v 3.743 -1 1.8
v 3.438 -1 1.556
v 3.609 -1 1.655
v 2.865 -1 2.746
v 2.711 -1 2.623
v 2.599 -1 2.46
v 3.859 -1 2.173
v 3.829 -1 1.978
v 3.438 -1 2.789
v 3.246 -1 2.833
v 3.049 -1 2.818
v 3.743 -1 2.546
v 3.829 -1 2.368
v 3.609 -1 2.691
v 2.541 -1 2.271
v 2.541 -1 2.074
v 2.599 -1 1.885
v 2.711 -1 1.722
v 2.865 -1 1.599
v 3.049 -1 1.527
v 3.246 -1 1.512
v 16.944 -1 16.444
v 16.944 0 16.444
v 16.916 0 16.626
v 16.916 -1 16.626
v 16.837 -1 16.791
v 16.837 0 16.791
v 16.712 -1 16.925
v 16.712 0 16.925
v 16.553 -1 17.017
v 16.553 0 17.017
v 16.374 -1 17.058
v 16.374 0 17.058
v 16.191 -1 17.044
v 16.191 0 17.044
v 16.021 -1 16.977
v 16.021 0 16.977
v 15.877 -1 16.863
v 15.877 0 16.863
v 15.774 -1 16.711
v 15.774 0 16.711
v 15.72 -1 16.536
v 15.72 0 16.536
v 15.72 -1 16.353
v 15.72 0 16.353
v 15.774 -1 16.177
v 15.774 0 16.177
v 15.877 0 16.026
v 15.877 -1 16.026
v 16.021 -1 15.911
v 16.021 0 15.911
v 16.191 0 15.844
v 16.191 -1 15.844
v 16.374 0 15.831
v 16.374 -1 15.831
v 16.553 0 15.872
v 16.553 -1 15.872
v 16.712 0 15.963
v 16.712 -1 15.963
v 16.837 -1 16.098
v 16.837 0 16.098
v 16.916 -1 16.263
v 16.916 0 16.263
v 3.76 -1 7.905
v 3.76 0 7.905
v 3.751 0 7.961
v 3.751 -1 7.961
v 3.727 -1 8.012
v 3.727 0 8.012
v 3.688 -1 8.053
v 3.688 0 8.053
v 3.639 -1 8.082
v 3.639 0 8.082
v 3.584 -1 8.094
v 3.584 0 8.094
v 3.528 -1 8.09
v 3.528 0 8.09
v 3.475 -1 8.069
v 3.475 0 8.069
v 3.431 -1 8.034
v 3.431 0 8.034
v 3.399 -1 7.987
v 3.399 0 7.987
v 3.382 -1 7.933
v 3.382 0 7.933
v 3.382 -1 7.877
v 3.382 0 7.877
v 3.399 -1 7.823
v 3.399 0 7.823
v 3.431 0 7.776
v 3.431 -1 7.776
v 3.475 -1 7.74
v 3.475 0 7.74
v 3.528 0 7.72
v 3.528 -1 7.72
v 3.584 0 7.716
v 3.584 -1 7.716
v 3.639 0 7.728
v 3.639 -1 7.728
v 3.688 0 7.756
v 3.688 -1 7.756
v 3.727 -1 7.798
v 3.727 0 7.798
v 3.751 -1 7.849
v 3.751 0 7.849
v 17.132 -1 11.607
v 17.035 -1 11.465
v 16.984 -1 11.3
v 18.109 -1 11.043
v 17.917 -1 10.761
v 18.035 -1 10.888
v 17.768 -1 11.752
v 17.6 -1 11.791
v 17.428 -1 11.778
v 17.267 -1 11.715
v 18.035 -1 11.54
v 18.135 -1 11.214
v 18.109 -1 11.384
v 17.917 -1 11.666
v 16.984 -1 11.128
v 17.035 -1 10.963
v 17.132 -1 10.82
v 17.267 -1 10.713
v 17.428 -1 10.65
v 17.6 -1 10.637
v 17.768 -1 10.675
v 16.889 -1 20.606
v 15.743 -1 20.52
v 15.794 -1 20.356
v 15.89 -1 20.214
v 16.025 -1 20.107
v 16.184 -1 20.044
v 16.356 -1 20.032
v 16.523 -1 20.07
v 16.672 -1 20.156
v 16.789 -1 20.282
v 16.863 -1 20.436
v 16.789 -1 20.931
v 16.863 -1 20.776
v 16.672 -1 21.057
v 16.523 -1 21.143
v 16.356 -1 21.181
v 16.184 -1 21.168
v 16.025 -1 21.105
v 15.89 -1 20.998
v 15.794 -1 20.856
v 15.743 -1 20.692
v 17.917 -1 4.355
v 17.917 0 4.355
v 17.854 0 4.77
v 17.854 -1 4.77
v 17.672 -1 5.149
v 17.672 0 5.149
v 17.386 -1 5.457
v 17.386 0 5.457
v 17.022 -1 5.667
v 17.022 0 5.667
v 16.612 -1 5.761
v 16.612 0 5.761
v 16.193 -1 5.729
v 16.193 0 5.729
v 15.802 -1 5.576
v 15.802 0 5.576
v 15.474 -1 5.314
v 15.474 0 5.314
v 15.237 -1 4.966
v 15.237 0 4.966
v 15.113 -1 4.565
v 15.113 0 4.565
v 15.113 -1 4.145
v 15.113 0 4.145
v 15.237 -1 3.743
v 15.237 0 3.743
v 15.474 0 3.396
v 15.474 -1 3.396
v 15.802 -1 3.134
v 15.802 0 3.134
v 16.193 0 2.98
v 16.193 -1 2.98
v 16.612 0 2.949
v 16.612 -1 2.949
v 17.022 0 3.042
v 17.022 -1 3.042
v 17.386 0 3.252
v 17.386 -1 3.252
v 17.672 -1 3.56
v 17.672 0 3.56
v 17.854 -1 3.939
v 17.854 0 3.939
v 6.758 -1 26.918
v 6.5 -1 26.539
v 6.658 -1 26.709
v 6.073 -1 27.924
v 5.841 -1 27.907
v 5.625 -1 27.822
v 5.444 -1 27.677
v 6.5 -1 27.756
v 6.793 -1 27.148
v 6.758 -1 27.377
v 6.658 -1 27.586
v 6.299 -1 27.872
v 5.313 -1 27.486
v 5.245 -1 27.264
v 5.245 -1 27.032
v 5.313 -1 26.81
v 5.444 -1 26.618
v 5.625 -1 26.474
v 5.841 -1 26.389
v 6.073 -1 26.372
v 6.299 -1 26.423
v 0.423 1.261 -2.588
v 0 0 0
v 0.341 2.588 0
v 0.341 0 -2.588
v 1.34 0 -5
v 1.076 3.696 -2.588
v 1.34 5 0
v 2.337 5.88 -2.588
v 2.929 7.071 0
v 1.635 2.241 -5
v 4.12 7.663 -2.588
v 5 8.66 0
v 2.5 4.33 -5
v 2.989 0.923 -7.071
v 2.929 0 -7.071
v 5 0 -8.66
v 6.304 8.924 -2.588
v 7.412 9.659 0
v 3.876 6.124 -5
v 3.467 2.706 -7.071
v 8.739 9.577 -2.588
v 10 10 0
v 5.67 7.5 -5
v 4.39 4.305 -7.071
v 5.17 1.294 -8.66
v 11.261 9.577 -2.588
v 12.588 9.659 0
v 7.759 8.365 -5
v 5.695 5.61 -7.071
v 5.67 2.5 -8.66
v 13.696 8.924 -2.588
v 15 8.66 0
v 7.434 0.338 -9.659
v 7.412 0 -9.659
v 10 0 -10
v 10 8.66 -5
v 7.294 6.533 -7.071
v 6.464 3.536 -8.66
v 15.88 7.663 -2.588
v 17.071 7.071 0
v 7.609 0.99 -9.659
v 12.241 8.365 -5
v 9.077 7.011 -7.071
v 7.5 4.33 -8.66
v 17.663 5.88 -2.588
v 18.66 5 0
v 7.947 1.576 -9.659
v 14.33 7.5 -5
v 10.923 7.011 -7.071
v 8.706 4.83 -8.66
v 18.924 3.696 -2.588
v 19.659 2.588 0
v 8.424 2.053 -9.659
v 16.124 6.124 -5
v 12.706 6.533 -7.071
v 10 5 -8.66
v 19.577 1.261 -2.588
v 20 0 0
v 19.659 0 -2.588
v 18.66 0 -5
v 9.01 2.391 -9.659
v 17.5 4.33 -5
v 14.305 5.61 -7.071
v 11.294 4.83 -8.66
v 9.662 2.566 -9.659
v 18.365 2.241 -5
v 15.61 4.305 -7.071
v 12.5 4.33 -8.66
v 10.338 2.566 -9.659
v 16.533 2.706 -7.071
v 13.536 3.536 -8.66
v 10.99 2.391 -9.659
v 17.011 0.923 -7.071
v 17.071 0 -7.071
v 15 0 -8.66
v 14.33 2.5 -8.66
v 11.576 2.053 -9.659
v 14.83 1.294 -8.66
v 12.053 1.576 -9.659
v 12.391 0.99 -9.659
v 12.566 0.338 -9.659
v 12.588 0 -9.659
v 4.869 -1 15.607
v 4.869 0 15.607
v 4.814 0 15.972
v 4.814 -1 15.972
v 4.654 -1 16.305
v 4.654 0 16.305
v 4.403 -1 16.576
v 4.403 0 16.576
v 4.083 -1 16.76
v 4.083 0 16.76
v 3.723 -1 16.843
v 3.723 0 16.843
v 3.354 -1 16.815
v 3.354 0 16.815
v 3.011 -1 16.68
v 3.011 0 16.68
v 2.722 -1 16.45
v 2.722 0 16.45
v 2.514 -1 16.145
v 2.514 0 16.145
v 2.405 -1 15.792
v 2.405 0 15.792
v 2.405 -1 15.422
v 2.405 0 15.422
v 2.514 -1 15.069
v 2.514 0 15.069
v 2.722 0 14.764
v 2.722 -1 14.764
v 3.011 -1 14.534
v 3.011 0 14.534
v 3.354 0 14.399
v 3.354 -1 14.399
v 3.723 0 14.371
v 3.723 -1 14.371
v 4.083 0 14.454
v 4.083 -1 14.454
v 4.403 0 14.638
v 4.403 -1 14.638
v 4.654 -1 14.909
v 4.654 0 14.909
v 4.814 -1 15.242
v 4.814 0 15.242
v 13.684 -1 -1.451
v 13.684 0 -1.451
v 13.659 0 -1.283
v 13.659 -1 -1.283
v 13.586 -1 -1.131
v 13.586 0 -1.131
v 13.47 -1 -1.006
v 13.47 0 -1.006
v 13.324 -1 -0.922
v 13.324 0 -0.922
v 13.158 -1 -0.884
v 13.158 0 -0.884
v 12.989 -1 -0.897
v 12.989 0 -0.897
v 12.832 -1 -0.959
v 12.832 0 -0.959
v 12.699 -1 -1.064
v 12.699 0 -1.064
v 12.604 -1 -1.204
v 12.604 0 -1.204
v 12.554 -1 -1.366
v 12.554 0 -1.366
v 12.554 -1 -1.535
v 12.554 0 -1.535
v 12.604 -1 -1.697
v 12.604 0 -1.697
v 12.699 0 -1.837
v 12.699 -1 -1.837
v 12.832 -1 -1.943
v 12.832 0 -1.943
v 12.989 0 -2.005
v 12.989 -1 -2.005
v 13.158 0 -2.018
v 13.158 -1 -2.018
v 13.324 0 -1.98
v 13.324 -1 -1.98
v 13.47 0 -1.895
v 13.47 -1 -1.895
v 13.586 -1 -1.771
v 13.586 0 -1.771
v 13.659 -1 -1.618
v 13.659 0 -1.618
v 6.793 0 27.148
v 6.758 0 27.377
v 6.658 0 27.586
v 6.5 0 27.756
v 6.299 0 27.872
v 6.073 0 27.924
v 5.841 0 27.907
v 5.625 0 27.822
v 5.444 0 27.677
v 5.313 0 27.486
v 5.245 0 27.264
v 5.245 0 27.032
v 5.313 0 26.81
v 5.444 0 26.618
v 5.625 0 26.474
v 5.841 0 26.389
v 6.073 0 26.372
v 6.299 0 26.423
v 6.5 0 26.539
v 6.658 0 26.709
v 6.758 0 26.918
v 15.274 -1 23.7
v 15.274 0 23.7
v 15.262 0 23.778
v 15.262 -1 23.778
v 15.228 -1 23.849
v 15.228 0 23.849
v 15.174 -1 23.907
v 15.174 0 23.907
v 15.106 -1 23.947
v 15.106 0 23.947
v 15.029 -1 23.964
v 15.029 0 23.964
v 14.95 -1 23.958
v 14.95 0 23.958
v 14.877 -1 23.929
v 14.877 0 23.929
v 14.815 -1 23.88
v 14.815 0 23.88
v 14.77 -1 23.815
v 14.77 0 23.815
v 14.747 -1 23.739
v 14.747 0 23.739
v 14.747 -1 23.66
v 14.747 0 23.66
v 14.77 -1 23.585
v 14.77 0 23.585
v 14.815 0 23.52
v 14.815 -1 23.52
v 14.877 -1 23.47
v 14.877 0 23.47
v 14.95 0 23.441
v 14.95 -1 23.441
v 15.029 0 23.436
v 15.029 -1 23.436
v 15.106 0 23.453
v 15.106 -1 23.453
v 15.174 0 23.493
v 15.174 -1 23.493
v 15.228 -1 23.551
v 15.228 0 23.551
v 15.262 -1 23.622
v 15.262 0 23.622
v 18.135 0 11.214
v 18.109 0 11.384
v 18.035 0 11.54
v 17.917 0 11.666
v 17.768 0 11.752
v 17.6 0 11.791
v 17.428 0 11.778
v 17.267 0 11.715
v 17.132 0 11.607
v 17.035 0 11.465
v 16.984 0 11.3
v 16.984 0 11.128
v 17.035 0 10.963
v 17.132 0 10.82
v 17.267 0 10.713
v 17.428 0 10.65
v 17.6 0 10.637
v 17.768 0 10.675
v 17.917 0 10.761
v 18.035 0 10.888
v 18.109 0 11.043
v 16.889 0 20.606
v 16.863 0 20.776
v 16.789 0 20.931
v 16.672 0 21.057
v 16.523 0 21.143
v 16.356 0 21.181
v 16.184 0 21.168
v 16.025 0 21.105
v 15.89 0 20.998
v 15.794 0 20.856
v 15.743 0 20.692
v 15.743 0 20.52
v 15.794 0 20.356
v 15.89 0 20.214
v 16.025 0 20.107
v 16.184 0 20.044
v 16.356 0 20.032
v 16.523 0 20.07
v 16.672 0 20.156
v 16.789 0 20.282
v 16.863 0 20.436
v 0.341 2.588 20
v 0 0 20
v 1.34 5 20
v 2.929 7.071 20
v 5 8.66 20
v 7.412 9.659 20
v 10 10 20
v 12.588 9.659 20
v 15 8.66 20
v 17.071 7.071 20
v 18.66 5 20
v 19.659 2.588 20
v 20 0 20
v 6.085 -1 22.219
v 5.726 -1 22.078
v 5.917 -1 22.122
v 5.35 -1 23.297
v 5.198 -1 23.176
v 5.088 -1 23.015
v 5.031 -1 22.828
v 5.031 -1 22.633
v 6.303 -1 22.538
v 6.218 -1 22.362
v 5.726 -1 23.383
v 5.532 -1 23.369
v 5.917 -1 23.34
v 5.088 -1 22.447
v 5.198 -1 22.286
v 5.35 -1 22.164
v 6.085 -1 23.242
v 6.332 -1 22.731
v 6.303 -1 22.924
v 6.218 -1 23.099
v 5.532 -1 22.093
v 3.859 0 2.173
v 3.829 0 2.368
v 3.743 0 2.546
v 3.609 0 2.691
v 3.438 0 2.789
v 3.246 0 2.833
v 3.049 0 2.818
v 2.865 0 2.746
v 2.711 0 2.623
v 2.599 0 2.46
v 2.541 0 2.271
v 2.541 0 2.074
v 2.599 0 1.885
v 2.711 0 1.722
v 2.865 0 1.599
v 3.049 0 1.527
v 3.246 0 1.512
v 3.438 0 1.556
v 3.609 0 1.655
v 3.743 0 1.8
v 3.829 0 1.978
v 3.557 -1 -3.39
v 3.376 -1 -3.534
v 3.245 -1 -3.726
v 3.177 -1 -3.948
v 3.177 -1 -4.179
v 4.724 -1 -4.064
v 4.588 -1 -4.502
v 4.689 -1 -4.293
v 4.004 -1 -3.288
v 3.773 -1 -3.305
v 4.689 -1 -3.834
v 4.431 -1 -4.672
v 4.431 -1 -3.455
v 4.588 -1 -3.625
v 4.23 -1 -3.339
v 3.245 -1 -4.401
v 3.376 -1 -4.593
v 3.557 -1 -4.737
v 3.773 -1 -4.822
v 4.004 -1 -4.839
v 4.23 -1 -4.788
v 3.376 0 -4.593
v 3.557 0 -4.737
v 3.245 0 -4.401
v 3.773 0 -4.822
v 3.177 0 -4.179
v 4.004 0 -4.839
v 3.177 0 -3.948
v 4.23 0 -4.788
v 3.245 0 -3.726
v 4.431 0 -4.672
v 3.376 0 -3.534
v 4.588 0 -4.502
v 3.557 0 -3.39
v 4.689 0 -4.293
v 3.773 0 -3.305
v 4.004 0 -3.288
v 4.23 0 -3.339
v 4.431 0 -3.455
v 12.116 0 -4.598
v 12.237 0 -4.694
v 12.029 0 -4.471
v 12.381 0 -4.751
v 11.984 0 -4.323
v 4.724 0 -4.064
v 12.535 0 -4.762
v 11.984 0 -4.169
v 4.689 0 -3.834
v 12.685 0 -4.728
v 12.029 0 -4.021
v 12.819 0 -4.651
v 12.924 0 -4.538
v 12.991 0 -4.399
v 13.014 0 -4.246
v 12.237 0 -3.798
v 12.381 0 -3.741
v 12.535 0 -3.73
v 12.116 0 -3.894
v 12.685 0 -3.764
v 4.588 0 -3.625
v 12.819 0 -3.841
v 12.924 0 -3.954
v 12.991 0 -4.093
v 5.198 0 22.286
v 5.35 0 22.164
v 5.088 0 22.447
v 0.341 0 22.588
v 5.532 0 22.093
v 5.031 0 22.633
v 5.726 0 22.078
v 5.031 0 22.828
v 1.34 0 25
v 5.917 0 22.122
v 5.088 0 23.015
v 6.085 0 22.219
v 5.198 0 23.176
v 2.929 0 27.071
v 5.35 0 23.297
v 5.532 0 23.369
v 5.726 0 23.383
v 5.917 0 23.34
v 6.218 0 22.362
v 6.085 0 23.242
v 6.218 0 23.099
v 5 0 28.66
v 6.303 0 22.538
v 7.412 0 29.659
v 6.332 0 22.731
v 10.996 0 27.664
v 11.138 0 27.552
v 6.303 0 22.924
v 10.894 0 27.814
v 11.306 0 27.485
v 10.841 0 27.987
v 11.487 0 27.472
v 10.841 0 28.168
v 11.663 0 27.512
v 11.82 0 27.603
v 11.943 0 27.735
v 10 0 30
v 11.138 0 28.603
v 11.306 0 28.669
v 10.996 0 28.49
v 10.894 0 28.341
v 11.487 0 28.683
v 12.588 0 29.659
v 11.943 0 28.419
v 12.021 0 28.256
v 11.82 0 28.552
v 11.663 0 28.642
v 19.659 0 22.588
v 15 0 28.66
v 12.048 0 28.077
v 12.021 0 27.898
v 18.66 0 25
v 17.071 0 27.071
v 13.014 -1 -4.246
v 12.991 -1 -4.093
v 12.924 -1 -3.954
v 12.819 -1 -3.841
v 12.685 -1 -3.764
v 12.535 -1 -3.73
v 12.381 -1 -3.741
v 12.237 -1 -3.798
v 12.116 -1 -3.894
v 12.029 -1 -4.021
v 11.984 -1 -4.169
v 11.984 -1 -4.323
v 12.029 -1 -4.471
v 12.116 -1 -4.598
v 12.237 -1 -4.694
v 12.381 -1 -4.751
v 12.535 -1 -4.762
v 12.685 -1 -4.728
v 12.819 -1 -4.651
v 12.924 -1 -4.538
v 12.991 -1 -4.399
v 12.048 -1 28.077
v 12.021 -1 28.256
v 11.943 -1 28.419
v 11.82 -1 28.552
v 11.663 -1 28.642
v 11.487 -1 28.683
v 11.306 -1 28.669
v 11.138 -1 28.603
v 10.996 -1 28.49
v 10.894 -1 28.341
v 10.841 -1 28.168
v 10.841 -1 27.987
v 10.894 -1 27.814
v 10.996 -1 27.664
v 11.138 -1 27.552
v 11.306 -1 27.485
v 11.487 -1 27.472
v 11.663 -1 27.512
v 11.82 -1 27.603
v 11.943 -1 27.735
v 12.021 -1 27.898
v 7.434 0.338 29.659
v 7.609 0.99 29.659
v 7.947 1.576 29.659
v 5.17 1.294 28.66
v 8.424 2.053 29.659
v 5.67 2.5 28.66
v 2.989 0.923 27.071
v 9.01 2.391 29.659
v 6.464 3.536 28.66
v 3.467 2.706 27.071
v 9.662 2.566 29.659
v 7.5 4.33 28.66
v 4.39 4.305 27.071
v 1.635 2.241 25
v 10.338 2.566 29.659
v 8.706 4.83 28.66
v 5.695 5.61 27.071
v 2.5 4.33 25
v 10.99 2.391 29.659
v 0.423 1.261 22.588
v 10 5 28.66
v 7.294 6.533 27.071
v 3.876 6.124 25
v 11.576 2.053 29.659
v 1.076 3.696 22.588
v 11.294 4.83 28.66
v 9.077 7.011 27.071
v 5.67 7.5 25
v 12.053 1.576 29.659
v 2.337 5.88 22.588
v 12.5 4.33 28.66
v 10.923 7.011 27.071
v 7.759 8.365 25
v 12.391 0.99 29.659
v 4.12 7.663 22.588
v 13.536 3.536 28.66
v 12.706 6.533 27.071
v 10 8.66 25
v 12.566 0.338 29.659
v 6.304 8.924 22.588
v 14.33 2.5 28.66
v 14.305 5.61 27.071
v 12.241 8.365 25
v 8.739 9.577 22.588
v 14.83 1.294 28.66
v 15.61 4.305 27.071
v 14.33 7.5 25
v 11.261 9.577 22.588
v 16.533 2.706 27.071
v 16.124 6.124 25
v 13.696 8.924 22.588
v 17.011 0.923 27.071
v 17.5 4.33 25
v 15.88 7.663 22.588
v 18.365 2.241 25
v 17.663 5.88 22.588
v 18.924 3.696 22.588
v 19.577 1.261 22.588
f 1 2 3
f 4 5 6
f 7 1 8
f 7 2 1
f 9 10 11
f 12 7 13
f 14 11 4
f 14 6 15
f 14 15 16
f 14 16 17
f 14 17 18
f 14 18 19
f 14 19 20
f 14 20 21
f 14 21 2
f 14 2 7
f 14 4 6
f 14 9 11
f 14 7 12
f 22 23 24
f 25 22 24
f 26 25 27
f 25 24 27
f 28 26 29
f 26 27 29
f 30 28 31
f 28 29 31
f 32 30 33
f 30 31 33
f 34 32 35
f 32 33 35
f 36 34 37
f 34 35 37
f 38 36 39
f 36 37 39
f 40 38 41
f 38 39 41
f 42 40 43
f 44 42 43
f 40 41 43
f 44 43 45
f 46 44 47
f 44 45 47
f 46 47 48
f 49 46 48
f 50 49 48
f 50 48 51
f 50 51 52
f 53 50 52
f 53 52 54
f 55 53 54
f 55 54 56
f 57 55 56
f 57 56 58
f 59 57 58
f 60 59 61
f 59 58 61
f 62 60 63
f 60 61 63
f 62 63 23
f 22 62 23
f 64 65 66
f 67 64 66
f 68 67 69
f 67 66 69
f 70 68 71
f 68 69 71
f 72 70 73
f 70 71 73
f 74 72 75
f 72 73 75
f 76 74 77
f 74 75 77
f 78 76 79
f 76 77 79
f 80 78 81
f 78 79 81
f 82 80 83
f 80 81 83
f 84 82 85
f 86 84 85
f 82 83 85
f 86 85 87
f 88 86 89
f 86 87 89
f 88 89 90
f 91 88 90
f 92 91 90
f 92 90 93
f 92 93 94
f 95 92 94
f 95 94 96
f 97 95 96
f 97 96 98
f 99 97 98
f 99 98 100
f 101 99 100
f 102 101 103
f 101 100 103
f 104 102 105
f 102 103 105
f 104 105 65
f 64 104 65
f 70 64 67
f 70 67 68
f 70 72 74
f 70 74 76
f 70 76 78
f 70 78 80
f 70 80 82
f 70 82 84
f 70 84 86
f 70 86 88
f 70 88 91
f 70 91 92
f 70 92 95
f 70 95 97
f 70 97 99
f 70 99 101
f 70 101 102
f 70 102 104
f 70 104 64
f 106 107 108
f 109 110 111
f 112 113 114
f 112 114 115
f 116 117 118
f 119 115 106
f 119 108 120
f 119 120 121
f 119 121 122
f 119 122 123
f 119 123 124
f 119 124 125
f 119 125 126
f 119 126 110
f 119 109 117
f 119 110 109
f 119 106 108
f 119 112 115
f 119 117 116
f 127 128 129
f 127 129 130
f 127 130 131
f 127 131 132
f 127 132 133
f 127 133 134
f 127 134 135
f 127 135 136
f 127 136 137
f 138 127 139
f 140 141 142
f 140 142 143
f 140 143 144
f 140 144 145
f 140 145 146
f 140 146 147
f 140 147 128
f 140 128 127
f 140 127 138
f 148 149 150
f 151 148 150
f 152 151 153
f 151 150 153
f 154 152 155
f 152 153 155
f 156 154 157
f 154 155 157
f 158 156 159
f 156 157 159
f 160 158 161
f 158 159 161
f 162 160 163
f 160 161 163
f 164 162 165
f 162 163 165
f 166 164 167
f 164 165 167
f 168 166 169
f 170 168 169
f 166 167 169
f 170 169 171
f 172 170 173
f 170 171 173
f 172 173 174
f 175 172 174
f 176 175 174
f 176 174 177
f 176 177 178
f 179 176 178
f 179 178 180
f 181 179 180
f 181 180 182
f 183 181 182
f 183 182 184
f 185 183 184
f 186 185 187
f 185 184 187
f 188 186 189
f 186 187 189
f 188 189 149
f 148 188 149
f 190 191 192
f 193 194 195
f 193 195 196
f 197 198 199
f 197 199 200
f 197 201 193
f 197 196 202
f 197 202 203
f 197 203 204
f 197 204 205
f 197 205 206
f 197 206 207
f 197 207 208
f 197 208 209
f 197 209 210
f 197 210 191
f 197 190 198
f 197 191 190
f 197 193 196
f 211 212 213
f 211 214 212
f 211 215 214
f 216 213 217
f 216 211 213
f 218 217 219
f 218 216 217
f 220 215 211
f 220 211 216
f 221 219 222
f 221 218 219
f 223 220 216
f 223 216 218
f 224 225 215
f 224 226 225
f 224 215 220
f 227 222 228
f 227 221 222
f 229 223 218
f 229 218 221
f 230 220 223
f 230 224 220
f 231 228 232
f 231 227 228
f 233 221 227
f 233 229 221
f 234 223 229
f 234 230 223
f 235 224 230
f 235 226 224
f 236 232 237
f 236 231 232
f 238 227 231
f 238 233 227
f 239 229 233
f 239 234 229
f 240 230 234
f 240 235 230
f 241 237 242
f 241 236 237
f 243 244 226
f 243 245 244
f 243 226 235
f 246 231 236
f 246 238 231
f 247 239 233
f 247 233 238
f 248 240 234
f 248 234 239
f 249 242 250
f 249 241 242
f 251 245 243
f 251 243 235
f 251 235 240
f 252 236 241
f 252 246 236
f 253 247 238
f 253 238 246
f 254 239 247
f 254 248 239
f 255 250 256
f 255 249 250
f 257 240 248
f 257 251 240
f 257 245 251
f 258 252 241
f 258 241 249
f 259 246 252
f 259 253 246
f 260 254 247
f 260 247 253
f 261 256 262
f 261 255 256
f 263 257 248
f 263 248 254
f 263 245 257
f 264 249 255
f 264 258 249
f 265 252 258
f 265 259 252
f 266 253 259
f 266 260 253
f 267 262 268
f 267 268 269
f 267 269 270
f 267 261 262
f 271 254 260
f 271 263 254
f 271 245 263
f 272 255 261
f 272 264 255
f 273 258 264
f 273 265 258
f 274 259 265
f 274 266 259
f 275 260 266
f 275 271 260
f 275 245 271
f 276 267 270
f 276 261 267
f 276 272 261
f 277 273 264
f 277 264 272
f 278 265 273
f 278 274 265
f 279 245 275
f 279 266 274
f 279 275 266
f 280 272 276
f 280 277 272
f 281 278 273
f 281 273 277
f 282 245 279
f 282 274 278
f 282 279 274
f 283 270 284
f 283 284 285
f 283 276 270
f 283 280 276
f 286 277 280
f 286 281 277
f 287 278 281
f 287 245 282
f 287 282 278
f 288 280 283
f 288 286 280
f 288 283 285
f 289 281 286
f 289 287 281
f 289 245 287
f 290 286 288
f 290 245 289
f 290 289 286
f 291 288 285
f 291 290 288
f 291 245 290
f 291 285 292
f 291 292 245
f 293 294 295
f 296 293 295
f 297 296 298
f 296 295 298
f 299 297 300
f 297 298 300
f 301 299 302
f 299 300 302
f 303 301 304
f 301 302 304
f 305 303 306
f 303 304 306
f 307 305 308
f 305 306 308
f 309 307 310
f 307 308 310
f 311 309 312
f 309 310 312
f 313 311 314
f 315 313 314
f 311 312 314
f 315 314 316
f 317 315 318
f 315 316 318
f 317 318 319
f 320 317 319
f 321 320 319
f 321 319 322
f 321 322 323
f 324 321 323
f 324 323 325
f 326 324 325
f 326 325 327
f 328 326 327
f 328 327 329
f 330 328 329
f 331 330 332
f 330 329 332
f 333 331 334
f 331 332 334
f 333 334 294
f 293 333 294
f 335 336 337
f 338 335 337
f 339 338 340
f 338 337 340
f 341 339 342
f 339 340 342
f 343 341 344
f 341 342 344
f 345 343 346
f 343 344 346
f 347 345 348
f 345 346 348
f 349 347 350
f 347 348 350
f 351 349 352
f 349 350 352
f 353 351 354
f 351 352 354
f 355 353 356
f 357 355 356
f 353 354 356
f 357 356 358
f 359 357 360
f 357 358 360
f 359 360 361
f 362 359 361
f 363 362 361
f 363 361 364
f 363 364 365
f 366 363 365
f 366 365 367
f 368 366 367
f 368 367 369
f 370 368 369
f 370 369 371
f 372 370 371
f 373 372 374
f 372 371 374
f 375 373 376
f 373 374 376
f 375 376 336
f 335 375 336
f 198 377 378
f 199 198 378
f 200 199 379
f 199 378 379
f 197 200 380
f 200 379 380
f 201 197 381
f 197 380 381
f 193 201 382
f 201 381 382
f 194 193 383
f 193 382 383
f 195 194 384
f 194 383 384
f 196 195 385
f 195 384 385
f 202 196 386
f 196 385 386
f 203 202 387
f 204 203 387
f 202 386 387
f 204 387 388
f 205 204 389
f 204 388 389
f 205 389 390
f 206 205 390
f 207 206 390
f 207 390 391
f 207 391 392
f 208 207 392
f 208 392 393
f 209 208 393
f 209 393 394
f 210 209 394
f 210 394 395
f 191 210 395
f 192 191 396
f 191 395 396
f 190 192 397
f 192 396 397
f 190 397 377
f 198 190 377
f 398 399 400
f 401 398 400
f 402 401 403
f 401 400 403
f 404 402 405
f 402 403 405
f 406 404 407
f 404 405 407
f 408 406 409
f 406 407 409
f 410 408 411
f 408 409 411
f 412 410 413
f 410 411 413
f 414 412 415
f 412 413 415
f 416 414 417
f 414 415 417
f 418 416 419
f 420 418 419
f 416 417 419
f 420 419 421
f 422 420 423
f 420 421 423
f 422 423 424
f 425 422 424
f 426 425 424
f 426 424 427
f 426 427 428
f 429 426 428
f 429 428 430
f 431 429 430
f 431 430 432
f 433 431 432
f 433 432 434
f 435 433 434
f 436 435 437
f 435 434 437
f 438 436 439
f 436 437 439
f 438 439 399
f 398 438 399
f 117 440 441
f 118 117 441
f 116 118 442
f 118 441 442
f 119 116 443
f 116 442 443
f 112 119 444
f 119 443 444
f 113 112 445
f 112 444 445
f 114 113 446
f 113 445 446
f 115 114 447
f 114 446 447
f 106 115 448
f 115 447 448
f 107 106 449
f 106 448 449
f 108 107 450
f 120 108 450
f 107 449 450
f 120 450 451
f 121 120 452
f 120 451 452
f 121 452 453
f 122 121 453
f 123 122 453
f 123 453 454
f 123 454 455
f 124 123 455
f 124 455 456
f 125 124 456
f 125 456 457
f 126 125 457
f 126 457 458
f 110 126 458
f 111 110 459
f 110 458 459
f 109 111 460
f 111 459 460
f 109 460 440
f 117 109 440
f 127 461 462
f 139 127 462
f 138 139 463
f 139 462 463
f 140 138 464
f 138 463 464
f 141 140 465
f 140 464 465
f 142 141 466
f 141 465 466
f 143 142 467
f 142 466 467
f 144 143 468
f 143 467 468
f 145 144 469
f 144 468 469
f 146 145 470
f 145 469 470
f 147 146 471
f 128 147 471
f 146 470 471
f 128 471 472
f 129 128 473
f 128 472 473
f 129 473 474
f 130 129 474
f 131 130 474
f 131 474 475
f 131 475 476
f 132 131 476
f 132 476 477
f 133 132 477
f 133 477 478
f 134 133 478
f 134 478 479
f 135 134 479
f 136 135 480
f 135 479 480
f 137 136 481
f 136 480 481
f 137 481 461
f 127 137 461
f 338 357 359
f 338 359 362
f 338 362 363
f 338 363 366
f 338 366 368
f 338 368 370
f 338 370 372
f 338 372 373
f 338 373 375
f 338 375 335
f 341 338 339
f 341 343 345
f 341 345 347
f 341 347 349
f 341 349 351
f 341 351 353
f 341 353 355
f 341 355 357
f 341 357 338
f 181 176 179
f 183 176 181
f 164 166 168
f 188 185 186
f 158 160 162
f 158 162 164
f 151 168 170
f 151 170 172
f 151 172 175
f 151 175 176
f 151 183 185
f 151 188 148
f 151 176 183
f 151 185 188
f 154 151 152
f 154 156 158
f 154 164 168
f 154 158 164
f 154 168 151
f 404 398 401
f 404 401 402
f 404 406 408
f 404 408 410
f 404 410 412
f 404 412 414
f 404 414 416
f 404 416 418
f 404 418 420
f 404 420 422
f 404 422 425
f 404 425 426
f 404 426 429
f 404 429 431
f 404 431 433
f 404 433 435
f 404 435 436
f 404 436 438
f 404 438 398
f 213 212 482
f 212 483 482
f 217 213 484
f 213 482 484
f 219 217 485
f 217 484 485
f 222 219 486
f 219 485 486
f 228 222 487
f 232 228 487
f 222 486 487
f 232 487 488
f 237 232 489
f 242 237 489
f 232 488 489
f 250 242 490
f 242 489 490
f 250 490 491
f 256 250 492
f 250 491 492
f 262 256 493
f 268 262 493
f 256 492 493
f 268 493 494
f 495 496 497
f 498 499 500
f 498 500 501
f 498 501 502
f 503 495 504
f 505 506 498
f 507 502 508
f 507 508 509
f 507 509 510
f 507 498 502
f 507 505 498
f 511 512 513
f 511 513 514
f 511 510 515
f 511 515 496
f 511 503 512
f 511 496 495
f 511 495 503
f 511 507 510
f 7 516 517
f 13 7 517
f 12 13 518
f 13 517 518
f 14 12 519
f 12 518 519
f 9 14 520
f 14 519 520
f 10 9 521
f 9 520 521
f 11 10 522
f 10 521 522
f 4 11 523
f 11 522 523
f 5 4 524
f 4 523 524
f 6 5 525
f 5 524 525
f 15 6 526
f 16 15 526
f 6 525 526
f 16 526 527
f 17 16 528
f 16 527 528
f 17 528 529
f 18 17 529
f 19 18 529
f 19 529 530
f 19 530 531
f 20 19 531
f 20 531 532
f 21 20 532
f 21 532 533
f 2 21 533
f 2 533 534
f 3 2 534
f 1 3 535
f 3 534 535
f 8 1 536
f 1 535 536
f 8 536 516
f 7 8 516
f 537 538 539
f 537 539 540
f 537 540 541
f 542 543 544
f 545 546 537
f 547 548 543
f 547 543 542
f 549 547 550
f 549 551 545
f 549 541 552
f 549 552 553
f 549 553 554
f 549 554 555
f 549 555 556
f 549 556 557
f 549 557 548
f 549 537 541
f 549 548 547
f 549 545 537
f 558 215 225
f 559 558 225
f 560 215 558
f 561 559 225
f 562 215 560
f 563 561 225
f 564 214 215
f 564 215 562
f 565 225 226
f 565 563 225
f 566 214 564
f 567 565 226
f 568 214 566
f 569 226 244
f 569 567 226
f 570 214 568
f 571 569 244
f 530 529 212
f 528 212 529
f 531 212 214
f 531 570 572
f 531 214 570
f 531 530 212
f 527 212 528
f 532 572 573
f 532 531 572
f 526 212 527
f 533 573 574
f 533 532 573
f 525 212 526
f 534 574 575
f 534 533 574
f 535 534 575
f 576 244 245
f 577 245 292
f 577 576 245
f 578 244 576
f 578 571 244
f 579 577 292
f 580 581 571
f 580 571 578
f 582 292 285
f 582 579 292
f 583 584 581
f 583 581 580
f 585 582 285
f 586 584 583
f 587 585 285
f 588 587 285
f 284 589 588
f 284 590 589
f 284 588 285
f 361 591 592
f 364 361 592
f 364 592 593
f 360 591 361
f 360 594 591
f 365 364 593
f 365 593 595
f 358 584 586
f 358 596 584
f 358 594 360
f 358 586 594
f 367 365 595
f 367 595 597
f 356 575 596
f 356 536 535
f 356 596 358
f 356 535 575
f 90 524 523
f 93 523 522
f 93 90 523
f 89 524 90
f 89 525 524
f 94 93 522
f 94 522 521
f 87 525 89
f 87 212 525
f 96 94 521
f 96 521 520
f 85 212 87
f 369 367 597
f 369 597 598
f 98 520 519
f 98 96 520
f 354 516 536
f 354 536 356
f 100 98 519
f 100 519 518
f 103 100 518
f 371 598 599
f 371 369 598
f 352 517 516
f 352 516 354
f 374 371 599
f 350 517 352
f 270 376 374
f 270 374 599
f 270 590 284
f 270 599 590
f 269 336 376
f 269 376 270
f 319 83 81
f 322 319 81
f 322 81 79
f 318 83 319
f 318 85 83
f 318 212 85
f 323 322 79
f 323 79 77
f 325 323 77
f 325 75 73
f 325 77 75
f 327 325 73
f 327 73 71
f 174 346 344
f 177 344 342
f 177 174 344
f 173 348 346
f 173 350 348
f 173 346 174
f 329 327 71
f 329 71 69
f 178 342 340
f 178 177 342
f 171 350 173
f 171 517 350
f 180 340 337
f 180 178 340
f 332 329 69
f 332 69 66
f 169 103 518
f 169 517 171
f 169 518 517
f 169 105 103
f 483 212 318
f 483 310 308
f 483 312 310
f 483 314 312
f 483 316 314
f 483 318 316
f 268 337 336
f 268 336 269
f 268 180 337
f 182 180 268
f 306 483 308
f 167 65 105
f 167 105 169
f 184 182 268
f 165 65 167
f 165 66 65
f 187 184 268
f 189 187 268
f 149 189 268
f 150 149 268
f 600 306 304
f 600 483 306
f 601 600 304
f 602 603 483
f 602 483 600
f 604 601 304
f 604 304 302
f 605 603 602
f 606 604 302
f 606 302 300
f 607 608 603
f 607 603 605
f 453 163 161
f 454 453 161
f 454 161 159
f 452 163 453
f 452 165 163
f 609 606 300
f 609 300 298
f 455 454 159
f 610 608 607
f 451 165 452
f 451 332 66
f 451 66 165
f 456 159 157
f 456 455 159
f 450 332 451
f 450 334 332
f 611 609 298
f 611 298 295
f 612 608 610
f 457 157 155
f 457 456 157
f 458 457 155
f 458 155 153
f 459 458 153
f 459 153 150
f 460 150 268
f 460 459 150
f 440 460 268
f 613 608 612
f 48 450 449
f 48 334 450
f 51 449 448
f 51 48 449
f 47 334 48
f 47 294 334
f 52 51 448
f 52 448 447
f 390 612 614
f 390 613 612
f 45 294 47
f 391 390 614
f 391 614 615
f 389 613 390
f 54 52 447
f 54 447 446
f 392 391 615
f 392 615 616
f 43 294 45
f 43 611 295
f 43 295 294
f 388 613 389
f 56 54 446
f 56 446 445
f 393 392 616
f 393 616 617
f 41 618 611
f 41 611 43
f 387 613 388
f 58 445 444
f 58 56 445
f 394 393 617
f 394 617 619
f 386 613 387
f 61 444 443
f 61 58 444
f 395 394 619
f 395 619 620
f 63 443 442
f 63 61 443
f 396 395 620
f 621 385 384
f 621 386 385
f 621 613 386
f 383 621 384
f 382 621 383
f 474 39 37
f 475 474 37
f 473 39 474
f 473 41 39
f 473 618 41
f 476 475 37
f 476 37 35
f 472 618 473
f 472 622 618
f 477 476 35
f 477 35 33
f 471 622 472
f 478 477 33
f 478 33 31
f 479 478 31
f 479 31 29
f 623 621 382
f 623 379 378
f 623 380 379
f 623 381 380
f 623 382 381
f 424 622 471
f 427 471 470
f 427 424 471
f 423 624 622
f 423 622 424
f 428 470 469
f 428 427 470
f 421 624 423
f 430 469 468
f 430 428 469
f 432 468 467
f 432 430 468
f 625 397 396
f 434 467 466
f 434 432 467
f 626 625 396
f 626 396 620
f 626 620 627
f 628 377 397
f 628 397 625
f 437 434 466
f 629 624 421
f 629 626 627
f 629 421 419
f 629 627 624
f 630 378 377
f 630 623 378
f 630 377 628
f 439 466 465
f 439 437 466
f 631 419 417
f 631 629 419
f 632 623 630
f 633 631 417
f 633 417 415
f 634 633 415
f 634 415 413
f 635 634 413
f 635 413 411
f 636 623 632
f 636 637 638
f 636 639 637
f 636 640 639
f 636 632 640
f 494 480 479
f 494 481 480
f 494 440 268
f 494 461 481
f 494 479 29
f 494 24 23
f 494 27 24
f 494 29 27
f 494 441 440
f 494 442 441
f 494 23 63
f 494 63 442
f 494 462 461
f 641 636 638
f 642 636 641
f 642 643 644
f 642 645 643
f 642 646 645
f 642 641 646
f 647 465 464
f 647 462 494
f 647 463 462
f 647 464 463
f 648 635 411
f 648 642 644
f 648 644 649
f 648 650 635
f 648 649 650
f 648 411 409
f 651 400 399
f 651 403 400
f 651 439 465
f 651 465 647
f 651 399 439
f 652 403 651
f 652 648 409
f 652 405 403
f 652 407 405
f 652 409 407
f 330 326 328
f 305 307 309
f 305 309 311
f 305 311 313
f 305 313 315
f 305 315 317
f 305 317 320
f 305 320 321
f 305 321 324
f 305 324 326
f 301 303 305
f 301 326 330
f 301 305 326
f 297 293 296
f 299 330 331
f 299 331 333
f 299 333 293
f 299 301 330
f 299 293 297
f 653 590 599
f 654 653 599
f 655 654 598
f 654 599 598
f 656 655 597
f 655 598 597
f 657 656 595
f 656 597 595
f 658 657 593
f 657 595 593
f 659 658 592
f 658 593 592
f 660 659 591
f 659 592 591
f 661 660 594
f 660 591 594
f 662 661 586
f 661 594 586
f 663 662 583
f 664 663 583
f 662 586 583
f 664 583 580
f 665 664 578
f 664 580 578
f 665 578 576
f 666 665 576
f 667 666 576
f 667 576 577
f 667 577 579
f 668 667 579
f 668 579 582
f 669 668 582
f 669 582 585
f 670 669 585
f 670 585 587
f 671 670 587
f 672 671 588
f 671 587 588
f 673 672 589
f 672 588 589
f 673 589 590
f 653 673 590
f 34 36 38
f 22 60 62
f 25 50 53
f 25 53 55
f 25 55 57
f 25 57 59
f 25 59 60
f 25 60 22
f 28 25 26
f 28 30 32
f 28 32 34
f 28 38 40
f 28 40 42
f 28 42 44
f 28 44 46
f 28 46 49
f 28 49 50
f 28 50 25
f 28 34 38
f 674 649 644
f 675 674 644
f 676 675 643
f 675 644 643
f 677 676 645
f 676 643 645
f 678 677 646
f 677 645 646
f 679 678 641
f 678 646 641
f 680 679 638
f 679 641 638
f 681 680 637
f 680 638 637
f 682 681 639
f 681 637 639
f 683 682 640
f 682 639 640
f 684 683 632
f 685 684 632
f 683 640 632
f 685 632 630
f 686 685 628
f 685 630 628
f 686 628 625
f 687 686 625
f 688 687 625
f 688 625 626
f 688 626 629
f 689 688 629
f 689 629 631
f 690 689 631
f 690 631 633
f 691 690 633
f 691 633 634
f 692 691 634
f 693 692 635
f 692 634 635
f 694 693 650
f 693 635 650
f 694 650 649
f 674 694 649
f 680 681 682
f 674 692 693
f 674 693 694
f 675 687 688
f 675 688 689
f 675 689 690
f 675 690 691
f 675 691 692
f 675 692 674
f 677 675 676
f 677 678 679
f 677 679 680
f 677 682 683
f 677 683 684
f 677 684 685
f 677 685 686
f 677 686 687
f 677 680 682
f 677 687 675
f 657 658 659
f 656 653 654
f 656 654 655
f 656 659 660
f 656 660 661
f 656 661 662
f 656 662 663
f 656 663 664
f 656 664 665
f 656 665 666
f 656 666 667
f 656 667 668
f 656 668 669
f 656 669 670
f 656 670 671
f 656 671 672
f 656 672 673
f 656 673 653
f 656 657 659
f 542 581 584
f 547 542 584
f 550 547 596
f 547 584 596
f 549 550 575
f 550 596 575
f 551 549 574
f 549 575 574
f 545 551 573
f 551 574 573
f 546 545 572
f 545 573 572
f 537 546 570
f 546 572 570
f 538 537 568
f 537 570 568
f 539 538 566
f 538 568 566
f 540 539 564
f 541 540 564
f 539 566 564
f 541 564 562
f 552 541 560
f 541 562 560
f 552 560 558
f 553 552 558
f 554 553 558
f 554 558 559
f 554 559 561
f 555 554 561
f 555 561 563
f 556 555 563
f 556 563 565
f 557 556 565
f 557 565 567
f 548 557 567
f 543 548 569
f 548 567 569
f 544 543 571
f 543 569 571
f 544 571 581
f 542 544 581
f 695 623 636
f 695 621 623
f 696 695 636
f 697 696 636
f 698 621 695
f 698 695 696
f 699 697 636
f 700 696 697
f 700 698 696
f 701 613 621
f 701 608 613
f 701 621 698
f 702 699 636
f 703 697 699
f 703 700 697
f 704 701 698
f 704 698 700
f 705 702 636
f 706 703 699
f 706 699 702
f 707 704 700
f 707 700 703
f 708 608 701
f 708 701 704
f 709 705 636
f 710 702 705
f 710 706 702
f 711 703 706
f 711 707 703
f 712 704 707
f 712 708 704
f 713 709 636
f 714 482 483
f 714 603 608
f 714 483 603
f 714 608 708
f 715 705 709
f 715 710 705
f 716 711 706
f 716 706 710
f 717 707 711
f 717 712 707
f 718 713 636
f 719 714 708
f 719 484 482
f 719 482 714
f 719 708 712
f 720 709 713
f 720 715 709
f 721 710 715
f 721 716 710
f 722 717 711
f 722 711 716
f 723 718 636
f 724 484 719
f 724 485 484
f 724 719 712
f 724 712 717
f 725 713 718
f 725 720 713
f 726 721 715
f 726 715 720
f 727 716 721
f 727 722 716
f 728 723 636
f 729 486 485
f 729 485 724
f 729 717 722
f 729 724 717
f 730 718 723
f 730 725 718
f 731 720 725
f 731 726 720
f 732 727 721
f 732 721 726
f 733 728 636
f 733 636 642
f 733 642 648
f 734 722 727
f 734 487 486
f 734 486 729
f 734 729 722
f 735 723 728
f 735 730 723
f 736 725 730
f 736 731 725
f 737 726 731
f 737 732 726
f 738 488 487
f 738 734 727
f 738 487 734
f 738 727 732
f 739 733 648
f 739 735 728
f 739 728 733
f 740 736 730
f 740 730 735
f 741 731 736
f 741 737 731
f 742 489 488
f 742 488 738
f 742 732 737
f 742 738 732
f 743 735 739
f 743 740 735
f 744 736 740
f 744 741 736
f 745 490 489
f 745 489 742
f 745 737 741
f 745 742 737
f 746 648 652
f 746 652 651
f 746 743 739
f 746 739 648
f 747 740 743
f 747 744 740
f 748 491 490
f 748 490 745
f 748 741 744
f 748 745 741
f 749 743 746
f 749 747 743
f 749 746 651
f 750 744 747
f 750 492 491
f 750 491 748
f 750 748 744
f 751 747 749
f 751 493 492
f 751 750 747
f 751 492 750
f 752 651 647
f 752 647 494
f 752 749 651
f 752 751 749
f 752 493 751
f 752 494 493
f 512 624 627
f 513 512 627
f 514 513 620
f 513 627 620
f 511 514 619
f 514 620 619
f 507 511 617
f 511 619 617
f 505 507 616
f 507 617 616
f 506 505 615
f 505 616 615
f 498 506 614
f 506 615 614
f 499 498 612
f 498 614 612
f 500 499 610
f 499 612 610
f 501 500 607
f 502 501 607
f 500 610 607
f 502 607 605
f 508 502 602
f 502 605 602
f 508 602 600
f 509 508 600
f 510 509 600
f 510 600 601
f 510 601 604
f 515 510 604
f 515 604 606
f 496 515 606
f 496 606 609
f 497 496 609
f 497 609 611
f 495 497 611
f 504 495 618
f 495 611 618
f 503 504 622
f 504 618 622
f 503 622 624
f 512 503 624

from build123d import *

# Parameters (mm, degrees)
F0_W     = 10
F0_H     = 20
F1_ANGLE = 180
F2_R     = 0.6542669189
F2_R_2   = 0.5762174249
F2_R_3   = 1.2390393019
F2_R_4   = 1.4098966941
F2_R_5   = 0.189897881
F2_R_6   = 0.6151811848
F2_R_7   = 0.7778029264
F2_R_8   = 0.6623255224
F2_R_9   = 0.6070903234
F2_R_10  = 0.7783808961
F2_R_11  = 0.265053414
F2_R_12  = 0.5177294077
F2_R_13  = 0.5684145952
F2_R_14  = 0.5786464401
F4_DEPTH = 1


# Not quite as in the source:
# - the program builds the solid bodies; features that only make, move or delete a surface that nothing else refers to are left out


with BuildPart() as f1:
    # F0 (on Front) → F1 (revolve)
    with BuildSketch(Plane.XZ):
        with Locations((5, 10)):
            Rectangle(F0_W, F0_H)
        with BuildLine():
            Line((10, 0), (0, 0))
            ThreePointArc((0, 0), (2.9289321881, -7.0710678119), (10, -10))
            Line((10, -10), (10, 0))
        make_face()
        with BuildLine():
            ThreePointArc((10, 30), (2.9289321881, 27.0710678119), (0, 20))
            Line((0, 20), (10, 20))
            Line((10, 20), (10, 30))
        make_face()
    revolve(axis=Axis((10, 0, 10), (0, 0, -1)), revolution_arc=F1_ANGLE)

    # F2 (on face) → F4 (join)
    with BuildSketch(Plane.XZ):
        with Locations((5.6774760596, 22.7308552712)):
            Circle(F2_R)
        with Locations((16.3127072155, 20.606238395)):
            Circle(F2_R_2)
        with Locations((3.6300569773, 15.6070627272)):
            Circle(F2_R_3)
        with Locations((16.507089138, 4.3547041714)):
            Circle(F2_R_4)
        with Locations((3.5698860884, 7.9049132764)):
            Circle(F2_R_5)
        with Locations((16.3283385336, 16.4442379028)):
            Circle(F2_R_6)
        with Locations((3.9457399398, -4.0635056794)):
            Circle(F2_R_7)
        with Locations((3.19618918, 2.172768116)):
            Circle(F2_R_8)
        with Locations((11.4412605762, 28.0772857368)):
            Circle(F2_R_9)
        with Locations((6.0145035386, 27.1478407085)):
            Circle(F2_R_10)
        with Locations((15.0091275573, 23.699901998)):
            Circle(F2_R_11)
        with Locations((12.4958753586, -4.2460225523)):
            Circle(F2_R_12)
        with Locations((13.1159704179, -1.4507770538)):
            Circle(F2_R_13)
        with Locations((17.5564400852, 11.2137598917)):
            Circle(F2_R_14)
    extrude(amount=F4_DEPTH)


solid = f1.part
